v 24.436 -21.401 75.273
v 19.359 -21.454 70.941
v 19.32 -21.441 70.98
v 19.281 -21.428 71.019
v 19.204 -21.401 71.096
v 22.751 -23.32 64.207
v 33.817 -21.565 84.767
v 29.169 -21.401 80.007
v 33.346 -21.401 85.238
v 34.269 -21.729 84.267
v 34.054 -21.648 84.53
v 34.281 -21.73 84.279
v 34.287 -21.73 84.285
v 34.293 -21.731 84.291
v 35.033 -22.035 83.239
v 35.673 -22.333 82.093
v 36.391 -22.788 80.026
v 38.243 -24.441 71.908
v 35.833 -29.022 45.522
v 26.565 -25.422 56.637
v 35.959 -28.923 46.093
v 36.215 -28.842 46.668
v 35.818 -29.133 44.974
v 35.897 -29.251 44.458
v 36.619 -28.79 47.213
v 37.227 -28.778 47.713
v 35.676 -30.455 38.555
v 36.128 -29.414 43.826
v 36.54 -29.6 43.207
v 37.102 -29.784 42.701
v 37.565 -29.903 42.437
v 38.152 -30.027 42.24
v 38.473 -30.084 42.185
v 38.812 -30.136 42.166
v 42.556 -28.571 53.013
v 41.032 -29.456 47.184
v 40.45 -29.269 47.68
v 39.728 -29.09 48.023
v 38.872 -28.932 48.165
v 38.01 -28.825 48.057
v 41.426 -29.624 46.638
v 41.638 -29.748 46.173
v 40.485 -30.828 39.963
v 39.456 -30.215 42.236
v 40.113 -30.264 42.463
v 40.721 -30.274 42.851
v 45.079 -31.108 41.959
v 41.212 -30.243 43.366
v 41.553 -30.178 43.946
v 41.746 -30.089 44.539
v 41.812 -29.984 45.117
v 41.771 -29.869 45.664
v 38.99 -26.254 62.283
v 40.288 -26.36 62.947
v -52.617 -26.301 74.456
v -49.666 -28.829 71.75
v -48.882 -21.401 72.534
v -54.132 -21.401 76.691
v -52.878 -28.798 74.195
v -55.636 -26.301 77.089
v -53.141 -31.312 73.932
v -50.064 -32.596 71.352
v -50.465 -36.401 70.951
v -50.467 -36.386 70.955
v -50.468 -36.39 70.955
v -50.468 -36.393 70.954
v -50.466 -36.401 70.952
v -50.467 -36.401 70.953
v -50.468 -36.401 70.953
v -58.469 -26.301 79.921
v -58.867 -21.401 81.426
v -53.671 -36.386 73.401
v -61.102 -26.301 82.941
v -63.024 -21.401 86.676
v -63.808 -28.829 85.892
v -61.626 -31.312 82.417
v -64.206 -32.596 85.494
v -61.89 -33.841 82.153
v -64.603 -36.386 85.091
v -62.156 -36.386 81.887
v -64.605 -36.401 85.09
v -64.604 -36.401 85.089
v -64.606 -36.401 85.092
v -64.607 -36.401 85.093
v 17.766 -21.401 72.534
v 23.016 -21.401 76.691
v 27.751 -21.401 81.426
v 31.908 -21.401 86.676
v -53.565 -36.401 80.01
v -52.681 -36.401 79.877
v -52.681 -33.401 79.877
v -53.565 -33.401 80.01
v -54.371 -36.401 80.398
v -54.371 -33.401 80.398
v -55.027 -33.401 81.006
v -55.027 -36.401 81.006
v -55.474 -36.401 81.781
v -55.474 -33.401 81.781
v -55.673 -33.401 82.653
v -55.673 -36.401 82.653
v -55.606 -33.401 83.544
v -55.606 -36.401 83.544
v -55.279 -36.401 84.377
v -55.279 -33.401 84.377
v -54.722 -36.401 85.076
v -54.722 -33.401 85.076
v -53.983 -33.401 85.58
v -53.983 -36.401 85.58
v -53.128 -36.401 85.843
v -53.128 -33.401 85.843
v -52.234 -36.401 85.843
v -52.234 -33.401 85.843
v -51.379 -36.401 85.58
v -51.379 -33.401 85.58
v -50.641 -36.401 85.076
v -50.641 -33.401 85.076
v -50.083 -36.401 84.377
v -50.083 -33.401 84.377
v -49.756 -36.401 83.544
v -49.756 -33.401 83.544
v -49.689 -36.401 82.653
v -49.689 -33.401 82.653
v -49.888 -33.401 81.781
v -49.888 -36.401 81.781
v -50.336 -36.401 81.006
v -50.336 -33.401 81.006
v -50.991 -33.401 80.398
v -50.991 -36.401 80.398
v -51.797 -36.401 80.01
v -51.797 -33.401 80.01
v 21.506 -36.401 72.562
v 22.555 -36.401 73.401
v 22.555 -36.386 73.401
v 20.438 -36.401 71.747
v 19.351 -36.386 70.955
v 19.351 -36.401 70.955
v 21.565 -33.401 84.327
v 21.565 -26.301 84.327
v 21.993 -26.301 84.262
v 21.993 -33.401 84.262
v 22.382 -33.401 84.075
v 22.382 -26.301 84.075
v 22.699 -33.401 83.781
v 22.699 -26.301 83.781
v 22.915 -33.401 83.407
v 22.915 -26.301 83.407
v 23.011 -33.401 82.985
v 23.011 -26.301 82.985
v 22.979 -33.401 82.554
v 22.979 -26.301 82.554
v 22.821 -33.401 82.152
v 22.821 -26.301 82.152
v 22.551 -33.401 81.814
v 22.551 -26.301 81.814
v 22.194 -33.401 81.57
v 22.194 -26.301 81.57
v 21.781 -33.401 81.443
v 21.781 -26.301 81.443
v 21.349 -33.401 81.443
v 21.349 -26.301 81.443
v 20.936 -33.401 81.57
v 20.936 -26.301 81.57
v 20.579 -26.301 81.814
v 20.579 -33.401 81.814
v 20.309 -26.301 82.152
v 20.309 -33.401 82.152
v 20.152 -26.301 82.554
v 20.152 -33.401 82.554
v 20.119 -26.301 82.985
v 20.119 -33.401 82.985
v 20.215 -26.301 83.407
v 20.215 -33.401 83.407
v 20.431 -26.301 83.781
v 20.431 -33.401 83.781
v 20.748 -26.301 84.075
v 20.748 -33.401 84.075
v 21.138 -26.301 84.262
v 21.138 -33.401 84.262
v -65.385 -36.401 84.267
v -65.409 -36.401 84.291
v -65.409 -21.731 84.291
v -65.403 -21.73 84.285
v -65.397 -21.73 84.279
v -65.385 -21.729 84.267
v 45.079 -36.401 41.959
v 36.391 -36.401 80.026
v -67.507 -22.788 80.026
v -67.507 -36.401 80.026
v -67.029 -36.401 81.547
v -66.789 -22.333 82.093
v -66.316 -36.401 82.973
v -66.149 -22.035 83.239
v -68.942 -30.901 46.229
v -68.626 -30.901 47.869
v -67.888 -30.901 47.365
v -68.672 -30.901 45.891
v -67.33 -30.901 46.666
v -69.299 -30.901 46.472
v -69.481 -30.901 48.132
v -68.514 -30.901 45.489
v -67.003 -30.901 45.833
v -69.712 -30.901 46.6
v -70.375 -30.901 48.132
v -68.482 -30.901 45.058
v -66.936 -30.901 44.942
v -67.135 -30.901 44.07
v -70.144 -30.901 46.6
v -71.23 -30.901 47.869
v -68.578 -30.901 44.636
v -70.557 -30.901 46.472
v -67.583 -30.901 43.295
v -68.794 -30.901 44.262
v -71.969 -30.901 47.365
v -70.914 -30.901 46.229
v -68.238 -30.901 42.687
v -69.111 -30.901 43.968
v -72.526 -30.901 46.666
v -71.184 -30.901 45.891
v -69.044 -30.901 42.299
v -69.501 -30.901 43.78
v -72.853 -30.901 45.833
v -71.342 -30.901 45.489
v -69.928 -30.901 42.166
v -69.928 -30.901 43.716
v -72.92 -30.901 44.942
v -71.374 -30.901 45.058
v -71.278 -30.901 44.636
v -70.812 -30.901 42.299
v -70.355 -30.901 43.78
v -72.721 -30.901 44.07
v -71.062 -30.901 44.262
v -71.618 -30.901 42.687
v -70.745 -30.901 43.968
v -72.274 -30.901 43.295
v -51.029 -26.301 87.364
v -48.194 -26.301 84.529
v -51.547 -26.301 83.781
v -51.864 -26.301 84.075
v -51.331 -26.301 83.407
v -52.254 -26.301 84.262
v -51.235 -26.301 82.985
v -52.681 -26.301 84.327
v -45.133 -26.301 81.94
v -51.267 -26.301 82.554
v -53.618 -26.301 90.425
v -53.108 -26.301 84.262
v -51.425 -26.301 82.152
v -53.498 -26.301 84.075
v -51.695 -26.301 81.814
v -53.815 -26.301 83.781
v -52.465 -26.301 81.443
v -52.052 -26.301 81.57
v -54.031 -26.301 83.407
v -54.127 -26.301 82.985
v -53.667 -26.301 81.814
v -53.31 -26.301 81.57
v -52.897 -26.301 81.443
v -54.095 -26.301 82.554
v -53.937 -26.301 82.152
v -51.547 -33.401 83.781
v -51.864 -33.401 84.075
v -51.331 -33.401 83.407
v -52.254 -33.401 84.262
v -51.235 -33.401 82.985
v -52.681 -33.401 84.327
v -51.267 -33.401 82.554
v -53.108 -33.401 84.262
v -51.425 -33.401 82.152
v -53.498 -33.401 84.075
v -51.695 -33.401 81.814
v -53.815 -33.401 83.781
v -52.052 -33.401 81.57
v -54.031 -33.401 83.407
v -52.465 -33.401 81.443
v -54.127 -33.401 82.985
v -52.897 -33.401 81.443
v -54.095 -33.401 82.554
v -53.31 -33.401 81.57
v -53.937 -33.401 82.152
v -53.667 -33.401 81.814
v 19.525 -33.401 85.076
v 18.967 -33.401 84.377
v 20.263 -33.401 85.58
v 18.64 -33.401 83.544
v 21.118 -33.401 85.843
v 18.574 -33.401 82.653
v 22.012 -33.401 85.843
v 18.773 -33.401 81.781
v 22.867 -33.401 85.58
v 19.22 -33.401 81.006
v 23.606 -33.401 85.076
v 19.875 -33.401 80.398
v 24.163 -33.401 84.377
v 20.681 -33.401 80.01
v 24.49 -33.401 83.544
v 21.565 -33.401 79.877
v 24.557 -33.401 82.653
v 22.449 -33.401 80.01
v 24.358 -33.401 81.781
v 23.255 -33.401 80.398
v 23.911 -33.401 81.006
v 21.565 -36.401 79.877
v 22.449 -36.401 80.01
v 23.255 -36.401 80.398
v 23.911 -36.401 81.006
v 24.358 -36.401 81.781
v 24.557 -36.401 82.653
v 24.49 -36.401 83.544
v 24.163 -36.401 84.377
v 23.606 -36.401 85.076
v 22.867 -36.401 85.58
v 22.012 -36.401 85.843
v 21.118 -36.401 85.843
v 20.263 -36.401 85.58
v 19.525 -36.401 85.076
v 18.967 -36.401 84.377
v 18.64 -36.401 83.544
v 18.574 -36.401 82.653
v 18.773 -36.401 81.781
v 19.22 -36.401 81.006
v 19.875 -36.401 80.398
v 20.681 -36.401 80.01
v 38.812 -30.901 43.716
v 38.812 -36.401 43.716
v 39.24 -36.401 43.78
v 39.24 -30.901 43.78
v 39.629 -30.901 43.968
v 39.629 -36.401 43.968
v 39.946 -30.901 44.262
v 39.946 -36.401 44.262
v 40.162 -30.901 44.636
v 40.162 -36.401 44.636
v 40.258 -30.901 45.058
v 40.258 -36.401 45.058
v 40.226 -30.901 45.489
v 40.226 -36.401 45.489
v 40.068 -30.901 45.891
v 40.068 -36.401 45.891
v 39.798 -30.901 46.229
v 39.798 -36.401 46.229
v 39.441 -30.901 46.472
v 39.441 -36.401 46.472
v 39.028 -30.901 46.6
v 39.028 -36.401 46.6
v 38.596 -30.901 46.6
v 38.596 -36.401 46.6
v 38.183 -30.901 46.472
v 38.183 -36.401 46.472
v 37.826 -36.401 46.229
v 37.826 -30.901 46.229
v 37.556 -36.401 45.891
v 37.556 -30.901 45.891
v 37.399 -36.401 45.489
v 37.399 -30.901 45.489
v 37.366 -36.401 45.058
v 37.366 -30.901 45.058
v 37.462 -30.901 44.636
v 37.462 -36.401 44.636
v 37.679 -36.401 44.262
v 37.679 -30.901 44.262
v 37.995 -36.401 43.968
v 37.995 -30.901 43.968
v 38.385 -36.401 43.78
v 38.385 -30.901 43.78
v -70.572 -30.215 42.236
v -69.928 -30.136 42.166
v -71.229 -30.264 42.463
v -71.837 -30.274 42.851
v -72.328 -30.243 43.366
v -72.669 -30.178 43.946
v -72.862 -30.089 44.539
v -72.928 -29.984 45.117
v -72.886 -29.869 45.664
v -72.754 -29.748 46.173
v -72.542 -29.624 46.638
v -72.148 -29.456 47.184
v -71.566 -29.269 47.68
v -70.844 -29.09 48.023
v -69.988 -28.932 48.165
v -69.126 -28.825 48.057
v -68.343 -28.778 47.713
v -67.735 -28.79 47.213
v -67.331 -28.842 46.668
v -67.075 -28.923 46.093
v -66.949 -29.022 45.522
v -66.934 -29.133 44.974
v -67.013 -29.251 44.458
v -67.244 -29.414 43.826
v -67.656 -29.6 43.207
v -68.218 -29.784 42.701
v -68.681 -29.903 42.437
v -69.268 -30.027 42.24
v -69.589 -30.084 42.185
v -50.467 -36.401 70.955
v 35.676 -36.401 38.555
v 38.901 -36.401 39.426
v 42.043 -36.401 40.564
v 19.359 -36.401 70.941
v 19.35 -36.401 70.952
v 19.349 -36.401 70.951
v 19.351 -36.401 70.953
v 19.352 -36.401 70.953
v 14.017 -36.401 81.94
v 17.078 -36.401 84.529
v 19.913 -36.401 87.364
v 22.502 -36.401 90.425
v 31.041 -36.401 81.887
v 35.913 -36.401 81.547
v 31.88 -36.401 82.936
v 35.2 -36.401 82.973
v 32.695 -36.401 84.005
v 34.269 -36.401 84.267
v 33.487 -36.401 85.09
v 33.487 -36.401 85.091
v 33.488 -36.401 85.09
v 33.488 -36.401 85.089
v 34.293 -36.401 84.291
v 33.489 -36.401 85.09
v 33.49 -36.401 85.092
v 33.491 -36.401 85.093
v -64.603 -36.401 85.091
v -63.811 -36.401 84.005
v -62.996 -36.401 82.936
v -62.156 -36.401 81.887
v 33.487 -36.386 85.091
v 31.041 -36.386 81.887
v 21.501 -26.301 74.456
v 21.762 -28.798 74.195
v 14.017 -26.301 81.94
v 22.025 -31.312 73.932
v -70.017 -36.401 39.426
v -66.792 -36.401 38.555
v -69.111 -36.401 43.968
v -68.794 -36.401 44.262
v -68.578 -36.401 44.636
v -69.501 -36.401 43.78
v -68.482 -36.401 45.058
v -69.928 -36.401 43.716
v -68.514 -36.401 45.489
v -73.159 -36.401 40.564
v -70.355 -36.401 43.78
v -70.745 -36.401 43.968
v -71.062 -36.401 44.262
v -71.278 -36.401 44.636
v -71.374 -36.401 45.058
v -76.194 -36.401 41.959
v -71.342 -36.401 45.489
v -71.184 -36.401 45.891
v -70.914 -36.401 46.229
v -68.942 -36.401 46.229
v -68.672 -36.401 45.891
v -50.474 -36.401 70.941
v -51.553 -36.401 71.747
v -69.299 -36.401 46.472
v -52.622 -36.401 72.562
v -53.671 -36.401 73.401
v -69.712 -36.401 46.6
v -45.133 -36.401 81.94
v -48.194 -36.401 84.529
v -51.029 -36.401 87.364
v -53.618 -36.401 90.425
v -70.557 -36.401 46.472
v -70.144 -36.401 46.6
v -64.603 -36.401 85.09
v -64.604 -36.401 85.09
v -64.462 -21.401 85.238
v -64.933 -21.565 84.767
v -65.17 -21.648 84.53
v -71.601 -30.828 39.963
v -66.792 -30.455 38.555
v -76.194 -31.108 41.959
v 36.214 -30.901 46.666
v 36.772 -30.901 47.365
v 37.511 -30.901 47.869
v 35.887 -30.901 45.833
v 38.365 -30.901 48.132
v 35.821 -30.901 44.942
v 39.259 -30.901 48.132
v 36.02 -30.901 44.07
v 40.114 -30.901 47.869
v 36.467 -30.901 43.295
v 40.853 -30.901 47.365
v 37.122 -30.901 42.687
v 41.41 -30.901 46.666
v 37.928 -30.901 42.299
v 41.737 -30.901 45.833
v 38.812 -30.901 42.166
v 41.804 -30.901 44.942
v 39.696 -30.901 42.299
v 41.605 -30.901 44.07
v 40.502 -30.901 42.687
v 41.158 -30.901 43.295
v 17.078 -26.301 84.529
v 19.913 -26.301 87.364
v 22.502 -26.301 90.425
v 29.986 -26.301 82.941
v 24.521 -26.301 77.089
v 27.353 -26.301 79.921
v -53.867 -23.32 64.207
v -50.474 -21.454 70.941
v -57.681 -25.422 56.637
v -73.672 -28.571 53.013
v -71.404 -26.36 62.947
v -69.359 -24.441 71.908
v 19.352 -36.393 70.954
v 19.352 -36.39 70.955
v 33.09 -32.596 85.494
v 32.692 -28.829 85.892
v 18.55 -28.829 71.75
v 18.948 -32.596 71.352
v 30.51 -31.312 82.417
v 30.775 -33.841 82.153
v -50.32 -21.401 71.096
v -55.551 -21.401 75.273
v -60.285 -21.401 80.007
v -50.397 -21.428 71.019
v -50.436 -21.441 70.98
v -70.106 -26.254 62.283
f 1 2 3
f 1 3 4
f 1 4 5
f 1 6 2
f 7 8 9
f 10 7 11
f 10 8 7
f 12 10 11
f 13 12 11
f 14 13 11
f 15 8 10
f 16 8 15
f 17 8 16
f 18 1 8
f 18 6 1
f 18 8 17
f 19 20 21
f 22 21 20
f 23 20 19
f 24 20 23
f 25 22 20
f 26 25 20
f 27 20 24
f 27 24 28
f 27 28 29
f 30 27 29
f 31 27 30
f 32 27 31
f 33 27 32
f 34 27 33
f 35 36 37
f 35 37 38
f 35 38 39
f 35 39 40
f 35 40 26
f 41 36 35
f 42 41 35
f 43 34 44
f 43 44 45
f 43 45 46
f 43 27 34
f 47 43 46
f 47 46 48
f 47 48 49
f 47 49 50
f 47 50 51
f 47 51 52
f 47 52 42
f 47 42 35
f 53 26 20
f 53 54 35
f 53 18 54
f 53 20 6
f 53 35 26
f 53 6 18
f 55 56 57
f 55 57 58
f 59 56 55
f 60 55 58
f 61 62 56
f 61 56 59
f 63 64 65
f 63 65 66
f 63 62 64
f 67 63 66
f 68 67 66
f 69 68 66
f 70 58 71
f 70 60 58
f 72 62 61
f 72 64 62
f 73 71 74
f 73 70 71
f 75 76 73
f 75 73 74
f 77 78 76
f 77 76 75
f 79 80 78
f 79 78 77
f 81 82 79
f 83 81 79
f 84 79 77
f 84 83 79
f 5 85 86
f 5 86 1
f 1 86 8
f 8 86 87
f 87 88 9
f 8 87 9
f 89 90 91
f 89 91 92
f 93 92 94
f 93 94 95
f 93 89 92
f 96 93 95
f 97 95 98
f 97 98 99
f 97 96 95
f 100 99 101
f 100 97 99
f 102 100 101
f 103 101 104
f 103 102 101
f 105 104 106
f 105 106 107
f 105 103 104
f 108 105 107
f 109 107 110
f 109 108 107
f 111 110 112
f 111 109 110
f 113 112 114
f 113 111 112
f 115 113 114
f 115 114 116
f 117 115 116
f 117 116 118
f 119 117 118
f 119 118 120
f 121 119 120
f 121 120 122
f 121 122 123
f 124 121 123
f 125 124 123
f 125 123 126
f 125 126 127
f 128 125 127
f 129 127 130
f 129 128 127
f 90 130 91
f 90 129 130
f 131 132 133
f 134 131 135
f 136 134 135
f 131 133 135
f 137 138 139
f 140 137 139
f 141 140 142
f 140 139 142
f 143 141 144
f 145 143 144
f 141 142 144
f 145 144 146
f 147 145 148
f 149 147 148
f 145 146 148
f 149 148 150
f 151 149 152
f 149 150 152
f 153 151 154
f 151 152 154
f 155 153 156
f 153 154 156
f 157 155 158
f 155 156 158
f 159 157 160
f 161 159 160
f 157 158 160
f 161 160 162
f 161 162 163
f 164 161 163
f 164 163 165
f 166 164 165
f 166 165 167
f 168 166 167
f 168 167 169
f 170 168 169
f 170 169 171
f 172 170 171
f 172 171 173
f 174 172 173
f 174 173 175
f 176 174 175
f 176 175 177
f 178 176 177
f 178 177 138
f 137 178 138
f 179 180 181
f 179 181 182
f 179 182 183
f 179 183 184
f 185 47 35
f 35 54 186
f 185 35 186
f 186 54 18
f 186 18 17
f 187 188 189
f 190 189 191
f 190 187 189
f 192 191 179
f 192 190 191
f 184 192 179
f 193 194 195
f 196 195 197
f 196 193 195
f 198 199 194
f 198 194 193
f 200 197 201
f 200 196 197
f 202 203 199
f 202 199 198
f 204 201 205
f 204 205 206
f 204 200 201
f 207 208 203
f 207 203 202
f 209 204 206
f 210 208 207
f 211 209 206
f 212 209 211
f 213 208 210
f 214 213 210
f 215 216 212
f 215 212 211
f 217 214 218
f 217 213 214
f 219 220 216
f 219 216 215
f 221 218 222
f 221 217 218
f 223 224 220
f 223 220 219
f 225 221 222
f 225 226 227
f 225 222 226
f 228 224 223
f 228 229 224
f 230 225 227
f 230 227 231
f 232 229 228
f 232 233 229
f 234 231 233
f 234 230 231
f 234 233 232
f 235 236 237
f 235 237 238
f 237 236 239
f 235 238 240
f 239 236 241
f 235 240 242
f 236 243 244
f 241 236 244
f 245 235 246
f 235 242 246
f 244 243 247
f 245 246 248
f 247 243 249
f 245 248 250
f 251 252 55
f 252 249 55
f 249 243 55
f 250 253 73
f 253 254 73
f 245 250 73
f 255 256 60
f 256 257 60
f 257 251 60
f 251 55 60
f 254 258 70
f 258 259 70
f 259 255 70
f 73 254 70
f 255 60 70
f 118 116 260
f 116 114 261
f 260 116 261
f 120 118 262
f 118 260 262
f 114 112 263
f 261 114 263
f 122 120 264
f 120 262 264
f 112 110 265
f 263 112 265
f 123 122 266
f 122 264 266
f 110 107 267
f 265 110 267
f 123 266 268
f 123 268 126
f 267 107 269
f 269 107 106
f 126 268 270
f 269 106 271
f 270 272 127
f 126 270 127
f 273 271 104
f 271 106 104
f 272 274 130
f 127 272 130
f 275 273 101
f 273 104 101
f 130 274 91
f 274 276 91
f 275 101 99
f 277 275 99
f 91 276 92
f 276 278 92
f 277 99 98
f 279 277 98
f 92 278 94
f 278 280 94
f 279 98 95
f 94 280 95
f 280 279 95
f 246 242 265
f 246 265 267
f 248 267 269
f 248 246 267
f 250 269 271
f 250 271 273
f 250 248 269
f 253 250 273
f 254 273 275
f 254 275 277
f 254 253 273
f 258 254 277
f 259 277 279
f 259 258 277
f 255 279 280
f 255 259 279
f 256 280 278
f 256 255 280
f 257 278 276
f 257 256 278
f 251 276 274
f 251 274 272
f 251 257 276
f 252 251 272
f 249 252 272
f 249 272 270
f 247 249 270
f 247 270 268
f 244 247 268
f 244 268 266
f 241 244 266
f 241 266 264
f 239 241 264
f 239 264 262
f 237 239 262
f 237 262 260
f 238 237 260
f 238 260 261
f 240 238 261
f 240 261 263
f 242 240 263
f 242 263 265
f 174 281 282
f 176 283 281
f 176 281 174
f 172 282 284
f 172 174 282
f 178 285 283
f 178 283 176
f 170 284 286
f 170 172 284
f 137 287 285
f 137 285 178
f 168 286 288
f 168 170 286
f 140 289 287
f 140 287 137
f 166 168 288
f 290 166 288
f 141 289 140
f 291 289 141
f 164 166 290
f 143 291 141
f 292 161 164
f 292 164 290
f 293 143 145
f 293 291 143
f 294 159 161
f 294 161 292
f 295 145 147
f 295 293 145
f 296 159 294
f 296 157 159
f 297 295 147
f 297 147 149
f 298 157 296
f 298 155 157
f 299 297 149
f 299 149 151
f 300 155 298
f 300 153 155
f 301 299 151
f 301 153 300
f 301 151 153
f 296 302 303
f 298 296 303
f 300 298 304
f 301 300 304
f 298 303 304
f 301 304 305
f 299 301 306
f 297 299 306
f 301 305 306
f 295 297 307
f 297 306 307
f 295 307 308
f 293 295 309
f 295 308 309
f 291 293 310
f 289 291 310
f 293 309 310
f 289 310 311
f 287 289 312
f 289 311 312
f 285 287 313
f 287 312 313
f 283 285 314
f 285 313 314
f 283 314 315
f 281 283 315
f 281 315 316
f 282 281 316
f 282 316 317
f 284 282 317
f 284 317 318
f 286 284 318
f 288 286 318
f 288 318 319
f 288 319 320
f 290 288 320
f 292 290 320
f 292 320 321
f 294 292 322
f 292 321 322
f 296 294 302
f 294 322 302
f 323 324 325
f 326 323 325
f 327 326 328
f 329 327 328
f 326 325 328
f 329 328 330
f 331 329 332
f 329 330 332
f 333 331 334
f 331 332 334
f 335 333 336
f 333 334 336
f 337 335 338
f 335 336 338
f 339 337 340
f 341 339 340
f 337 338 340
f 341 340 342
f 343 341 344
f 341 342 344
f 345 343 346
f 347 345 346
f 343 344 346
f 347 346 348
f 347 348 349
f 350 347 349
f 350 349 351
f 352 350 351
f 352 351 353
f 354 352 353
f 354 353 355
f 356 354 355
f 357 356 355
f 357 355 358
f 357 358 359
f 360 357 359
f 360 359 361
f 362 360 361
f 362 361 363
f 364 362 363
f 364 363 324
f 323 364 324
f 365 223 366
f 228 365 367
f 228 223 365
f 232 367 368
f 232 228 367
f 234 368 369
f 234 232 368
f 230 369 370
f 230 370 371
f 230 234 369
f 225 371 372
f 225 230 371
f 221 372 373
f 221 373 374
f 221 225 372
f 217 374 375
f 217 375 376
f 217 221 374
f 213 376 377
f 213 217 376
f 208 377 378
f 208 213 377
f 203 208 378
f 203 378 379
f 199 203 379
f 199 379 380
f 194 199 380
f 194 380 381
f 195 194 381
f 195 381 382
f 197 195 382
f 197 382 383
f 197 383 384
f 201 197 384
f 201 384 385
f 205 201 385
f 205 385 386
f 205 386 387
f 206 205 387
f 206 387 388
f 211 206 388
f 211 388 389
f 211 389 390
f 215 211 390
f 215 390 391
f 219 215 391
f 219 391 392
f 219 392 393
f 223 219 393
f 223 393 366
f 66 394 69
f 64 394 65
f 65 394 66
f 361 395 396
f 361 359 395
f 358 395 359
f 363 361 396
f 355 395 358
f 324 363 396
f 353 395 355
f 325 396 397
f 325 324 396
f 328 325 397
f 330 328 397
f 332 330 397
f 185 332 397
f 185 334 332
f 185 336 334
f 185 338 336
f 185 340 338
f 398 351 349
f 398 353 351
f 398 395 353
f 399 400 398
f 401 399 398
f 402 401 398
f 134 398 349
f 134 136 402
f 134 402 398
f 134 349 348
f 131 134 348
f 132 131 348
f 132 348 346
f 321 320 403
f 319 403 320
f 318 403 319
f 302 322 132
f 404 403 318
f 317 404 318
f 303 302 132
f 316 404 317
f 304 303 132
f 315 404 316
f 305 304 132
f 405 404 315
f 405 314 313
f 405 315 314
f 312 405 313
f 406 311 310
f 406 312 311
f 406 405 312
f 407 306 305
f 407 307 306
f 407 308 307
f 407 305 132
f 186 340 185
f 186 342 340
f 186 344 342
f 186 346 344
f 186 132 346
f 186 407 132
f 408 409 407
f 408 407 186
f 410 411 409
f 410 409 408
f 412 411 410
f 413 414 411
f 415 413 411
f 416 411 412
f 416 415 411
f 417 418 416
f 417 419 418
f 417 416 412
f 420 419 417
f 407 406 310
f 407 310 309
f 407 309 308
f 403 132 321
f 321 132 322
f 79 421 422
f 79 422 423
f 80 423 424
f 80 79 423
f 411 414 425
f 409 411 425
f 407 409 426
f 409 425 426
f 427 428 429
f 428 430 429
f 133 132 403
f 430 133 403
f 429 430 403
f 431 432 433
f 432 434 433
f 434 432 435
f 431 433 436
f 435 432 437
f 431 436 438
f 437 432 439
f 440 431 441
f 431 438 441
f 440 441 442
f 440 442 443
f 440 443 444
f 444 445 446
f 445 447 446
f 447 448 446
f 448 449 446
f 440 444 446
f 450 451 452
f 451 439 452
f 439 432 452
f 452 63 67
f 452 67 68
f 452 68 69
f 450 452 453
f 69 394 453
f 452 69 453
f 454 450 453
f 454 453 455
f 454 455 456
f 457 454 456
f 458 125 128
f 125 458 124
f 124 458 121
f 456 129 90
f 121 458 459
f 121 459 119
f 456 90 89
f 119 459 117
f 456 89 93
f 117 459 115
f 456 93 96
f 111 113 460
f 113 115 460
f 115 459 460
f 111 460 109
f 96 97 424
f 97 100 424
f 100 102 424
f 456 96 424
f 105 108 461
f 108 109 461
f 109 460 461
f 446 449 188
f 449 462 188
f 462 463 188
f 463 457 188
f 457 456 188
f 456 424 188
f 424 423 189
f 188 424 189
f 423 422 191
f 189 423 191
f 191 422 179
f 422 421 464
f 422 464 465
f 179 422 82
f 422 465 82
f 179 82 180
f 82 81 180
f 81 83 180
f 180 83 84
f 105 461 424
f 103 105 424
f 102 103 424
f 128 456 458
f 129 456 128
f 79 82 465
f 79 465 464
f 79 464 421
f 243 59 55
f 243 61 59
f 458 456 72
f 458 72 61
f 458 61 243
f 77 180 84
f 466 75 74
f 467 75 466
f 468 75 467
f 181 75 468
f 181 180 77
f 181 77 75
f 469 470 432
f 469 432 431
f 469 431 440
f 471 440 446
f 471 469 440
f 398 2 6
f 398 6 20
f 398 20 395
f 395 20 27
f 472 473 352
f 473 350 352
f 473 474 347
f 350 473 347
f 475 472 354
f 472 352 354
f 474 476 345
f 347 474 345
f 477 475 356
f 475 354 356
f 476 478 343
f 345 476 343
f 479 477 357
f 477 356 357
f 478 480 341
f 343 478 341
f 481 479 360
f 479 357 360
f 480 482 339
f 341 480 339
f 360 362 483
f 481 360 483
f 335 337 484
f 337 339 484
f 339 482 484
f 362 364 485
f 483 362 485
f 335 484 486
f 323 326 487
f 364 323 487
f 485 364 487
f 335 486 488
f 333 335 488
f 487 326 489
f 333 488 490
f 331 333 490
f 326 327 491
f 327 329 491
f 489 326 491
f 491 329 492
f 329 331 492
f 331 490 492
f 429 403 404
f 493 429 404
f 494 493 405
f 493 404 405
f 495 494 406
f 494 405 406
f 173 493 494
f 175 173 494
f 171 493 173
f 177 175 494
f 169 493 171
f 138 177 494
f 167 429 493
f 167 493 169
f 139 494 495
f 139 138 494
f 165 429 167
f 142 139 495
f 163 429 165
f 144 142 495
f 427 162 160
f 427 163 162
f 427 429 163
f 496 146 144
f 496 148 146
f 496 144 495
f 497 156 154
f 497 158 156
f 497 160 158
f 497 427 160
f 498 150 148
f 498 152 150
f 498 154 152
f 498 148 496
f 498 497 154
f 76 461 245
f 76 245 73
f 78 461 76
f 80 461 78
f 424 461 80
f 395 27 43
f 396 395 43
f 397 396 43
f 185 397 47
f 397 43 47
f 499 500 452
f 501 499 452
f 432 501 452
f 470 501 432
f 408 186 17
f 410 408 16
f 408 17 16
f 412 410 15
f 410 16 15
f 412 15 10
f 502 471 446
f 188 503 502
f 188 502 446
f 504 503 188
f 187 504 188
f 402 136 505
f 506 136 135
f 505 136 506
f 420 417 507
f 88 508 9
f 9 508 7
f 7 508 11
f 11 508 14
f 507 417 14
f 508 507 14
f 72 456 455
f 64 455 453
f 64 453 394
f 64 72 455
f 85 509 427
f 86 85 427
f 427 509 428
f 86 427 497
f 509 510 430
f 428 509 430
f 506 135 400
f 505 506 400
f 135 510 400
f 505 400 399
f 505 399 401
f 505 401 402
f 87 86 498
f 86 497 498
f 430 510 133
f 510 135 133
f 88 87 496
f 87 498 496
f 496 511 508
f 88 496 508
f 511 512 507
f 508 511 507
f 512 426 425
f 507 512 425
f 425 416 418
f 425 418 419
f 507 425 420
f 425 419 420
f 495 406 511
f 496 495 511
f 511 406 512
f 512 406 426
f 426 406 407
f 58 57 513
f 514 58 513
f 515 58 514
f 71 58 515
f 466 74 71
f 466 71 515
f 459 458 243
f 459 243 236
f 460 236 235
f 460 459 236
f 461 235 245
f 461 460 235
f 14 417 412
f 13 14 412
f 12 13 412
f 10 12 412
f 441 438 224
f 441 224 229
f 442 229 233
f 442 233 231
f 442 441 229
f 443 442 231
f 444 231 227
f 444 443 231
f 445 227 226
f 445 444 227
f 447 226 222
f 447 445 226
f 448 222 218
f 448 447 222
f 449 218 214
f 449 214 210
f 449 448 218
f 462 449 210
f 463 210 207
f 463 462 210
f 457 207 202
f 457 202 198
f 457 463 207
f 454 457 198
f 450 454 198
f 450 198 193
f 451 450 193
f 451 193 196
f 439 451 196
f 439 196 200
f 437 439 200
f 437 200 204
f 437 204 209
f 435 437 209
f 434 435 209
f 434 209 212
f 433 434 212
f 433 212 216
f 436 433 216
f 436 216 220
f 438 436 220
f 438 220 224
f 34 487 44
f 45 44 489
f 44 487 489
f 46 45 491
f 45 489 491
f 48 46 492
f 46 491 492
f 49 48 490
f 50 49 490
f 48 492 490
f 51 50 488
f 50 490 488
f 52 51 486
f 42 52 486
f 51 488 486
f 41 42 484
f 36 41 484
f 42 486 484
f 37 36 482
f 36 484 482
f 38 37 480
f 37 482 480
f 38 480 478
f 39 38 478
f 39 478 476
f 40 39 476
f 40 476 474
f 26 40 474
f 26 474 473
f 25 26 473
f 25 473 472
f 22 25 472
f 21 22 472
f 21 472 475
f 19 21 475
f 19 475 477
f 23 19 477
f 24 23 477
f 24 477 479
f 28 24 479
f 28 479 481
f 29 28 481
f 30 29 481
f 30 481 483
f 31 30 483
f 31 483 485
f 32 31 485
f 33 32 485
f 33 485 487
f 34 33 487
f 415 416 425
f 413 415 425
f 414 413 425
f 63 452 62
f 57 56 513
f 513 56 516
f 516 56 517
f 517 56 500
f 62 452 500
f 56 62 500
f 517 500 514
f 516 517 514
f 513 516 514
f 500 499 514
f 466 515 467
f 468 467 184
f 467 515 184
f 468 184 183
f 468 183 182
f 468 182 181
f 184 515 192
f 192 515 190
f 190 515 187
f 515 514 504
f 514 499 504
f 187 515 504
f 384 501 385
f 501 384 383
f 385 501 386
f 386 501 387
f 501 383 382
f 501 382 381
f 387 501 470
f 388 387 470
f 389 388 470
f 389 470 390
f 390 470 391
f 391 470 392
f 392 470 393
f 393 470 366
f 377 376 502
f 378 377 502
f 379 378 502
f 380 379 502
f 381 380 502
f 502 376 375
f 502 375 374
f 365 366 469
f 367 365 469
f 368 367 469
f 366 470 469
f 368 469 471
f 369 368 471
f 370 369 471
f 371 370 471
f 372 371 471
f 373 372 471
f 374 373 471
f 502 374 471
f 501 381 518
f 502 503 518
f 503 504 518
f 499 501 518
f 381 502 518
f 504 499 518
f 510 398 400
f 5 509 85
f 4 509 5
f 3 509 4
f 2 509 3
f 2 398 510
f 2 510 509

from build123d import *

# Parameters (mm, degrees)
SALIENTE_EXTRUIR1_START = -36.400588291
SALIENTE_EXTRUIR1_DEPTH = 10.1
SALIENTE_EXTRUIR2_REACH = 99.517
SALIENTE_EXTRUIR2_START = -2.5
CROQUIS2_W              = 20
CROQUIS2_H              = 15
SALIENTE_EXTRUIR3_START = -15
SALIENTE_EXTRUIR3_DEPTH = 15
CORTAR_EXTRUIR1_START   = -5.5
CROQUIS5_R              = 3
CORTAR_EXTRUIR1_DEPTH   = 5
CROQUIS7_R              = 1.45
CORTAR_EXTRUIR2_DEPTH   = 10
CROQUIS8_R              = 1.45
CORTAR_EXTRUIR3_DEPTH   = 12
CROQUIS9_R              = 3
CORTAR_EXTRUIR4_DEPTH   = 3


# Read off the part's stored shape, not the designer's step: Saliente-Extruir1, Saliente-Extruir3
with BuildPart() as part:
    # Saliente-Extruir1 outline → Saliente-Extruir1 (new body)
    with BuildSketch(Plane(origin=(0, 0, 0), x_dir=(1, 0, 0), z_dir=(0, 1, 0)).offset(SALIENTE_EXTRUIR1_START)):
        with BuildLine():
            Line((22.502132111, -90.425189571), (33.23240821, -79.694913472))
            Line((33.23240821, -79.694913472), (24.747126835, -71.209632098))
            Line((24.747126835, -71.209632098), (14.016850737, -81.939908197))
            ThreePointArc((14.016850737, -81.939908197), (18.524587161, -85.917453147), (22.502132111, -90.425189571))
        make_face()
    extrude(amount=SALIENTE_EXTRUIR1_DEPTH)

    # Saliente-Extruir2: up to this cone (the profile starts outside it)
    saliente_extruir2_end = Plane(origin=(-15.557959692, -28.900588, 120), z_dir=(0, -1, 0)) * Cone(35.699767219, 82.498652467, 318.232419686, mode=Mode.PRIVATE)
    # Croquis2 → Saliente-Extruir2 (add, up to the surface)
    with BuildSketch(Plane(origin=(-23.231252631, 0, 23.231252631), x_dir=(-0.7071067811865487, 0, -0.7071067811865464), z_dir=(0.7071067811865464, 0, -0.7071067811865487)).offset(SALIENTE_EXTRUIR2_START), mode=Mode.PRIVATE) as saliente_extruir2_sk1:
        with Locations((-73.851674943, -28.900588291)):
            Rectangle(CROQUIS2_W, CROQUIS2_H)
    saliente_extruir2_tool1 = extrude(saliente_extruir2_sk1.sketch, amount=-SALIENTE_EXTRUIR2_REACH, mode=Mode.PRIVATE) - saliente_extruir2_end
    add(saliente_extruir2_tool1.solids().sort_by_distance((27.222001, -28.900588, 77.22004))[0])

    # Saliente-Extruir3 outline → Saliente-Extruir3 (add)
    with BuildSketch(Plane.XZ.offset(36.400588291).offset(SALIENTE_EXTRUIR3_START)):
        with BuildLine():
            ThreePointArc((35.675661183, 38.555225896), (40.483879833, 39.962158782), (45.07851977, 41.95908406))
            Line((45.07851977, 41.95908406), (36.39064162, 80.025775234))
            ThreePointArc((36.39064162, 80.025775234), (35.31648143, 82.774817587), (33.486624065, 85.090562823))
            ThreePointArc((33.486624065, 85.090562823), (27.009868535, 77.432171773), (19.351477485, 70.955416242))
            Line((19.351477485, 70.955416242), (19.352456623, 70.953472853))
            Line((19.352456623, 70.953472853), (35.675661183, 38.555225896))
        make_face()
    extrude(amount=SALIENTE_EXTRUIR3_DEPTH)

    # Croquis4 → Cortar-Revolución1 (revolve, cut)
    with BuildSketch(Plane(origin=(-15.557959692, -2.400588291, 120), x_dir=(0, 0, -1), z_dir=(1, 0, 0))):
        Polygon((60, -19), (100, -29), (100, -12.364078099), (60, -12.364078099), align=None)
    revolve(axis=Axis((-15.557959692, -2.400588291, 120), (0, -1, 0)), mode=Mode.SUBTRACT)

    # Croquis5 → Cortar-Extruir1 (cut)
    with BuildSketch(Plane.XZ.offset(36.400588291).offset(CORTAR_EXTRUIR1_START)):
        with Locations(Location((38.812176145, 45.16592802, 0), (0, 0, 270))):
            Circle(CROQUIS5_R)
    extrude(amount=-CORTAR_EXTRUIR1_DEPTH, mode=Mode.SUBTRACT)

    # Croquis7 → Cortar-Extruir2 (cut)
    with BuildSketch(Plane.XZ.offset(36.400588291)):
        with Locations(Location((38.812176145, 45.16592802, 0), (0, 0, 270))):
            Circle(CROQUIS7_R)
    extrude(amount=-CORTAR_EXTRUIR2_DEPTH, mode=Mode.SUBTRACT)

    # Croquis8 → Cortar-Extruir3 (cut)
    with BuildSketch(Plane(origin=(0, -26.300588291, 0), x_dir=(1, 0, 0), z_dir=(0, 1, 0))):
        with Locations(Location((21.56514632, -82.876893988, 0), (0, 0, 270))):
            Circle(CROQUIS8_R)
    extrude(amount=-CORTAR_EXTRUIR3_DEPTH, mode=Mode.SUBTRACT)

    # Croquis9 → Cortar-Extruir4 (cut)
    with BuildSketch(Plane.XZ.offset(36.400588291)):
        with Locations(Location((21.56514632, 82.876893988, 0), (0, 0, 270))):
            Circle(CROQUIS9_R)
    extrude(amount=-CORTAR_EXTRUIR4_DEPTH, mode=Mode.SUBTRACT)


with BuildPart() as body_2:
    # Simetría5: mirrored copy
    add(part.part.mirror(Plane(origin=(-15.557959692, -2.400588291, 120), x_dir=(0, 0, 1), z_dir=(1, 0, 0))))


solid = Compound([part.part, body_2.part])
